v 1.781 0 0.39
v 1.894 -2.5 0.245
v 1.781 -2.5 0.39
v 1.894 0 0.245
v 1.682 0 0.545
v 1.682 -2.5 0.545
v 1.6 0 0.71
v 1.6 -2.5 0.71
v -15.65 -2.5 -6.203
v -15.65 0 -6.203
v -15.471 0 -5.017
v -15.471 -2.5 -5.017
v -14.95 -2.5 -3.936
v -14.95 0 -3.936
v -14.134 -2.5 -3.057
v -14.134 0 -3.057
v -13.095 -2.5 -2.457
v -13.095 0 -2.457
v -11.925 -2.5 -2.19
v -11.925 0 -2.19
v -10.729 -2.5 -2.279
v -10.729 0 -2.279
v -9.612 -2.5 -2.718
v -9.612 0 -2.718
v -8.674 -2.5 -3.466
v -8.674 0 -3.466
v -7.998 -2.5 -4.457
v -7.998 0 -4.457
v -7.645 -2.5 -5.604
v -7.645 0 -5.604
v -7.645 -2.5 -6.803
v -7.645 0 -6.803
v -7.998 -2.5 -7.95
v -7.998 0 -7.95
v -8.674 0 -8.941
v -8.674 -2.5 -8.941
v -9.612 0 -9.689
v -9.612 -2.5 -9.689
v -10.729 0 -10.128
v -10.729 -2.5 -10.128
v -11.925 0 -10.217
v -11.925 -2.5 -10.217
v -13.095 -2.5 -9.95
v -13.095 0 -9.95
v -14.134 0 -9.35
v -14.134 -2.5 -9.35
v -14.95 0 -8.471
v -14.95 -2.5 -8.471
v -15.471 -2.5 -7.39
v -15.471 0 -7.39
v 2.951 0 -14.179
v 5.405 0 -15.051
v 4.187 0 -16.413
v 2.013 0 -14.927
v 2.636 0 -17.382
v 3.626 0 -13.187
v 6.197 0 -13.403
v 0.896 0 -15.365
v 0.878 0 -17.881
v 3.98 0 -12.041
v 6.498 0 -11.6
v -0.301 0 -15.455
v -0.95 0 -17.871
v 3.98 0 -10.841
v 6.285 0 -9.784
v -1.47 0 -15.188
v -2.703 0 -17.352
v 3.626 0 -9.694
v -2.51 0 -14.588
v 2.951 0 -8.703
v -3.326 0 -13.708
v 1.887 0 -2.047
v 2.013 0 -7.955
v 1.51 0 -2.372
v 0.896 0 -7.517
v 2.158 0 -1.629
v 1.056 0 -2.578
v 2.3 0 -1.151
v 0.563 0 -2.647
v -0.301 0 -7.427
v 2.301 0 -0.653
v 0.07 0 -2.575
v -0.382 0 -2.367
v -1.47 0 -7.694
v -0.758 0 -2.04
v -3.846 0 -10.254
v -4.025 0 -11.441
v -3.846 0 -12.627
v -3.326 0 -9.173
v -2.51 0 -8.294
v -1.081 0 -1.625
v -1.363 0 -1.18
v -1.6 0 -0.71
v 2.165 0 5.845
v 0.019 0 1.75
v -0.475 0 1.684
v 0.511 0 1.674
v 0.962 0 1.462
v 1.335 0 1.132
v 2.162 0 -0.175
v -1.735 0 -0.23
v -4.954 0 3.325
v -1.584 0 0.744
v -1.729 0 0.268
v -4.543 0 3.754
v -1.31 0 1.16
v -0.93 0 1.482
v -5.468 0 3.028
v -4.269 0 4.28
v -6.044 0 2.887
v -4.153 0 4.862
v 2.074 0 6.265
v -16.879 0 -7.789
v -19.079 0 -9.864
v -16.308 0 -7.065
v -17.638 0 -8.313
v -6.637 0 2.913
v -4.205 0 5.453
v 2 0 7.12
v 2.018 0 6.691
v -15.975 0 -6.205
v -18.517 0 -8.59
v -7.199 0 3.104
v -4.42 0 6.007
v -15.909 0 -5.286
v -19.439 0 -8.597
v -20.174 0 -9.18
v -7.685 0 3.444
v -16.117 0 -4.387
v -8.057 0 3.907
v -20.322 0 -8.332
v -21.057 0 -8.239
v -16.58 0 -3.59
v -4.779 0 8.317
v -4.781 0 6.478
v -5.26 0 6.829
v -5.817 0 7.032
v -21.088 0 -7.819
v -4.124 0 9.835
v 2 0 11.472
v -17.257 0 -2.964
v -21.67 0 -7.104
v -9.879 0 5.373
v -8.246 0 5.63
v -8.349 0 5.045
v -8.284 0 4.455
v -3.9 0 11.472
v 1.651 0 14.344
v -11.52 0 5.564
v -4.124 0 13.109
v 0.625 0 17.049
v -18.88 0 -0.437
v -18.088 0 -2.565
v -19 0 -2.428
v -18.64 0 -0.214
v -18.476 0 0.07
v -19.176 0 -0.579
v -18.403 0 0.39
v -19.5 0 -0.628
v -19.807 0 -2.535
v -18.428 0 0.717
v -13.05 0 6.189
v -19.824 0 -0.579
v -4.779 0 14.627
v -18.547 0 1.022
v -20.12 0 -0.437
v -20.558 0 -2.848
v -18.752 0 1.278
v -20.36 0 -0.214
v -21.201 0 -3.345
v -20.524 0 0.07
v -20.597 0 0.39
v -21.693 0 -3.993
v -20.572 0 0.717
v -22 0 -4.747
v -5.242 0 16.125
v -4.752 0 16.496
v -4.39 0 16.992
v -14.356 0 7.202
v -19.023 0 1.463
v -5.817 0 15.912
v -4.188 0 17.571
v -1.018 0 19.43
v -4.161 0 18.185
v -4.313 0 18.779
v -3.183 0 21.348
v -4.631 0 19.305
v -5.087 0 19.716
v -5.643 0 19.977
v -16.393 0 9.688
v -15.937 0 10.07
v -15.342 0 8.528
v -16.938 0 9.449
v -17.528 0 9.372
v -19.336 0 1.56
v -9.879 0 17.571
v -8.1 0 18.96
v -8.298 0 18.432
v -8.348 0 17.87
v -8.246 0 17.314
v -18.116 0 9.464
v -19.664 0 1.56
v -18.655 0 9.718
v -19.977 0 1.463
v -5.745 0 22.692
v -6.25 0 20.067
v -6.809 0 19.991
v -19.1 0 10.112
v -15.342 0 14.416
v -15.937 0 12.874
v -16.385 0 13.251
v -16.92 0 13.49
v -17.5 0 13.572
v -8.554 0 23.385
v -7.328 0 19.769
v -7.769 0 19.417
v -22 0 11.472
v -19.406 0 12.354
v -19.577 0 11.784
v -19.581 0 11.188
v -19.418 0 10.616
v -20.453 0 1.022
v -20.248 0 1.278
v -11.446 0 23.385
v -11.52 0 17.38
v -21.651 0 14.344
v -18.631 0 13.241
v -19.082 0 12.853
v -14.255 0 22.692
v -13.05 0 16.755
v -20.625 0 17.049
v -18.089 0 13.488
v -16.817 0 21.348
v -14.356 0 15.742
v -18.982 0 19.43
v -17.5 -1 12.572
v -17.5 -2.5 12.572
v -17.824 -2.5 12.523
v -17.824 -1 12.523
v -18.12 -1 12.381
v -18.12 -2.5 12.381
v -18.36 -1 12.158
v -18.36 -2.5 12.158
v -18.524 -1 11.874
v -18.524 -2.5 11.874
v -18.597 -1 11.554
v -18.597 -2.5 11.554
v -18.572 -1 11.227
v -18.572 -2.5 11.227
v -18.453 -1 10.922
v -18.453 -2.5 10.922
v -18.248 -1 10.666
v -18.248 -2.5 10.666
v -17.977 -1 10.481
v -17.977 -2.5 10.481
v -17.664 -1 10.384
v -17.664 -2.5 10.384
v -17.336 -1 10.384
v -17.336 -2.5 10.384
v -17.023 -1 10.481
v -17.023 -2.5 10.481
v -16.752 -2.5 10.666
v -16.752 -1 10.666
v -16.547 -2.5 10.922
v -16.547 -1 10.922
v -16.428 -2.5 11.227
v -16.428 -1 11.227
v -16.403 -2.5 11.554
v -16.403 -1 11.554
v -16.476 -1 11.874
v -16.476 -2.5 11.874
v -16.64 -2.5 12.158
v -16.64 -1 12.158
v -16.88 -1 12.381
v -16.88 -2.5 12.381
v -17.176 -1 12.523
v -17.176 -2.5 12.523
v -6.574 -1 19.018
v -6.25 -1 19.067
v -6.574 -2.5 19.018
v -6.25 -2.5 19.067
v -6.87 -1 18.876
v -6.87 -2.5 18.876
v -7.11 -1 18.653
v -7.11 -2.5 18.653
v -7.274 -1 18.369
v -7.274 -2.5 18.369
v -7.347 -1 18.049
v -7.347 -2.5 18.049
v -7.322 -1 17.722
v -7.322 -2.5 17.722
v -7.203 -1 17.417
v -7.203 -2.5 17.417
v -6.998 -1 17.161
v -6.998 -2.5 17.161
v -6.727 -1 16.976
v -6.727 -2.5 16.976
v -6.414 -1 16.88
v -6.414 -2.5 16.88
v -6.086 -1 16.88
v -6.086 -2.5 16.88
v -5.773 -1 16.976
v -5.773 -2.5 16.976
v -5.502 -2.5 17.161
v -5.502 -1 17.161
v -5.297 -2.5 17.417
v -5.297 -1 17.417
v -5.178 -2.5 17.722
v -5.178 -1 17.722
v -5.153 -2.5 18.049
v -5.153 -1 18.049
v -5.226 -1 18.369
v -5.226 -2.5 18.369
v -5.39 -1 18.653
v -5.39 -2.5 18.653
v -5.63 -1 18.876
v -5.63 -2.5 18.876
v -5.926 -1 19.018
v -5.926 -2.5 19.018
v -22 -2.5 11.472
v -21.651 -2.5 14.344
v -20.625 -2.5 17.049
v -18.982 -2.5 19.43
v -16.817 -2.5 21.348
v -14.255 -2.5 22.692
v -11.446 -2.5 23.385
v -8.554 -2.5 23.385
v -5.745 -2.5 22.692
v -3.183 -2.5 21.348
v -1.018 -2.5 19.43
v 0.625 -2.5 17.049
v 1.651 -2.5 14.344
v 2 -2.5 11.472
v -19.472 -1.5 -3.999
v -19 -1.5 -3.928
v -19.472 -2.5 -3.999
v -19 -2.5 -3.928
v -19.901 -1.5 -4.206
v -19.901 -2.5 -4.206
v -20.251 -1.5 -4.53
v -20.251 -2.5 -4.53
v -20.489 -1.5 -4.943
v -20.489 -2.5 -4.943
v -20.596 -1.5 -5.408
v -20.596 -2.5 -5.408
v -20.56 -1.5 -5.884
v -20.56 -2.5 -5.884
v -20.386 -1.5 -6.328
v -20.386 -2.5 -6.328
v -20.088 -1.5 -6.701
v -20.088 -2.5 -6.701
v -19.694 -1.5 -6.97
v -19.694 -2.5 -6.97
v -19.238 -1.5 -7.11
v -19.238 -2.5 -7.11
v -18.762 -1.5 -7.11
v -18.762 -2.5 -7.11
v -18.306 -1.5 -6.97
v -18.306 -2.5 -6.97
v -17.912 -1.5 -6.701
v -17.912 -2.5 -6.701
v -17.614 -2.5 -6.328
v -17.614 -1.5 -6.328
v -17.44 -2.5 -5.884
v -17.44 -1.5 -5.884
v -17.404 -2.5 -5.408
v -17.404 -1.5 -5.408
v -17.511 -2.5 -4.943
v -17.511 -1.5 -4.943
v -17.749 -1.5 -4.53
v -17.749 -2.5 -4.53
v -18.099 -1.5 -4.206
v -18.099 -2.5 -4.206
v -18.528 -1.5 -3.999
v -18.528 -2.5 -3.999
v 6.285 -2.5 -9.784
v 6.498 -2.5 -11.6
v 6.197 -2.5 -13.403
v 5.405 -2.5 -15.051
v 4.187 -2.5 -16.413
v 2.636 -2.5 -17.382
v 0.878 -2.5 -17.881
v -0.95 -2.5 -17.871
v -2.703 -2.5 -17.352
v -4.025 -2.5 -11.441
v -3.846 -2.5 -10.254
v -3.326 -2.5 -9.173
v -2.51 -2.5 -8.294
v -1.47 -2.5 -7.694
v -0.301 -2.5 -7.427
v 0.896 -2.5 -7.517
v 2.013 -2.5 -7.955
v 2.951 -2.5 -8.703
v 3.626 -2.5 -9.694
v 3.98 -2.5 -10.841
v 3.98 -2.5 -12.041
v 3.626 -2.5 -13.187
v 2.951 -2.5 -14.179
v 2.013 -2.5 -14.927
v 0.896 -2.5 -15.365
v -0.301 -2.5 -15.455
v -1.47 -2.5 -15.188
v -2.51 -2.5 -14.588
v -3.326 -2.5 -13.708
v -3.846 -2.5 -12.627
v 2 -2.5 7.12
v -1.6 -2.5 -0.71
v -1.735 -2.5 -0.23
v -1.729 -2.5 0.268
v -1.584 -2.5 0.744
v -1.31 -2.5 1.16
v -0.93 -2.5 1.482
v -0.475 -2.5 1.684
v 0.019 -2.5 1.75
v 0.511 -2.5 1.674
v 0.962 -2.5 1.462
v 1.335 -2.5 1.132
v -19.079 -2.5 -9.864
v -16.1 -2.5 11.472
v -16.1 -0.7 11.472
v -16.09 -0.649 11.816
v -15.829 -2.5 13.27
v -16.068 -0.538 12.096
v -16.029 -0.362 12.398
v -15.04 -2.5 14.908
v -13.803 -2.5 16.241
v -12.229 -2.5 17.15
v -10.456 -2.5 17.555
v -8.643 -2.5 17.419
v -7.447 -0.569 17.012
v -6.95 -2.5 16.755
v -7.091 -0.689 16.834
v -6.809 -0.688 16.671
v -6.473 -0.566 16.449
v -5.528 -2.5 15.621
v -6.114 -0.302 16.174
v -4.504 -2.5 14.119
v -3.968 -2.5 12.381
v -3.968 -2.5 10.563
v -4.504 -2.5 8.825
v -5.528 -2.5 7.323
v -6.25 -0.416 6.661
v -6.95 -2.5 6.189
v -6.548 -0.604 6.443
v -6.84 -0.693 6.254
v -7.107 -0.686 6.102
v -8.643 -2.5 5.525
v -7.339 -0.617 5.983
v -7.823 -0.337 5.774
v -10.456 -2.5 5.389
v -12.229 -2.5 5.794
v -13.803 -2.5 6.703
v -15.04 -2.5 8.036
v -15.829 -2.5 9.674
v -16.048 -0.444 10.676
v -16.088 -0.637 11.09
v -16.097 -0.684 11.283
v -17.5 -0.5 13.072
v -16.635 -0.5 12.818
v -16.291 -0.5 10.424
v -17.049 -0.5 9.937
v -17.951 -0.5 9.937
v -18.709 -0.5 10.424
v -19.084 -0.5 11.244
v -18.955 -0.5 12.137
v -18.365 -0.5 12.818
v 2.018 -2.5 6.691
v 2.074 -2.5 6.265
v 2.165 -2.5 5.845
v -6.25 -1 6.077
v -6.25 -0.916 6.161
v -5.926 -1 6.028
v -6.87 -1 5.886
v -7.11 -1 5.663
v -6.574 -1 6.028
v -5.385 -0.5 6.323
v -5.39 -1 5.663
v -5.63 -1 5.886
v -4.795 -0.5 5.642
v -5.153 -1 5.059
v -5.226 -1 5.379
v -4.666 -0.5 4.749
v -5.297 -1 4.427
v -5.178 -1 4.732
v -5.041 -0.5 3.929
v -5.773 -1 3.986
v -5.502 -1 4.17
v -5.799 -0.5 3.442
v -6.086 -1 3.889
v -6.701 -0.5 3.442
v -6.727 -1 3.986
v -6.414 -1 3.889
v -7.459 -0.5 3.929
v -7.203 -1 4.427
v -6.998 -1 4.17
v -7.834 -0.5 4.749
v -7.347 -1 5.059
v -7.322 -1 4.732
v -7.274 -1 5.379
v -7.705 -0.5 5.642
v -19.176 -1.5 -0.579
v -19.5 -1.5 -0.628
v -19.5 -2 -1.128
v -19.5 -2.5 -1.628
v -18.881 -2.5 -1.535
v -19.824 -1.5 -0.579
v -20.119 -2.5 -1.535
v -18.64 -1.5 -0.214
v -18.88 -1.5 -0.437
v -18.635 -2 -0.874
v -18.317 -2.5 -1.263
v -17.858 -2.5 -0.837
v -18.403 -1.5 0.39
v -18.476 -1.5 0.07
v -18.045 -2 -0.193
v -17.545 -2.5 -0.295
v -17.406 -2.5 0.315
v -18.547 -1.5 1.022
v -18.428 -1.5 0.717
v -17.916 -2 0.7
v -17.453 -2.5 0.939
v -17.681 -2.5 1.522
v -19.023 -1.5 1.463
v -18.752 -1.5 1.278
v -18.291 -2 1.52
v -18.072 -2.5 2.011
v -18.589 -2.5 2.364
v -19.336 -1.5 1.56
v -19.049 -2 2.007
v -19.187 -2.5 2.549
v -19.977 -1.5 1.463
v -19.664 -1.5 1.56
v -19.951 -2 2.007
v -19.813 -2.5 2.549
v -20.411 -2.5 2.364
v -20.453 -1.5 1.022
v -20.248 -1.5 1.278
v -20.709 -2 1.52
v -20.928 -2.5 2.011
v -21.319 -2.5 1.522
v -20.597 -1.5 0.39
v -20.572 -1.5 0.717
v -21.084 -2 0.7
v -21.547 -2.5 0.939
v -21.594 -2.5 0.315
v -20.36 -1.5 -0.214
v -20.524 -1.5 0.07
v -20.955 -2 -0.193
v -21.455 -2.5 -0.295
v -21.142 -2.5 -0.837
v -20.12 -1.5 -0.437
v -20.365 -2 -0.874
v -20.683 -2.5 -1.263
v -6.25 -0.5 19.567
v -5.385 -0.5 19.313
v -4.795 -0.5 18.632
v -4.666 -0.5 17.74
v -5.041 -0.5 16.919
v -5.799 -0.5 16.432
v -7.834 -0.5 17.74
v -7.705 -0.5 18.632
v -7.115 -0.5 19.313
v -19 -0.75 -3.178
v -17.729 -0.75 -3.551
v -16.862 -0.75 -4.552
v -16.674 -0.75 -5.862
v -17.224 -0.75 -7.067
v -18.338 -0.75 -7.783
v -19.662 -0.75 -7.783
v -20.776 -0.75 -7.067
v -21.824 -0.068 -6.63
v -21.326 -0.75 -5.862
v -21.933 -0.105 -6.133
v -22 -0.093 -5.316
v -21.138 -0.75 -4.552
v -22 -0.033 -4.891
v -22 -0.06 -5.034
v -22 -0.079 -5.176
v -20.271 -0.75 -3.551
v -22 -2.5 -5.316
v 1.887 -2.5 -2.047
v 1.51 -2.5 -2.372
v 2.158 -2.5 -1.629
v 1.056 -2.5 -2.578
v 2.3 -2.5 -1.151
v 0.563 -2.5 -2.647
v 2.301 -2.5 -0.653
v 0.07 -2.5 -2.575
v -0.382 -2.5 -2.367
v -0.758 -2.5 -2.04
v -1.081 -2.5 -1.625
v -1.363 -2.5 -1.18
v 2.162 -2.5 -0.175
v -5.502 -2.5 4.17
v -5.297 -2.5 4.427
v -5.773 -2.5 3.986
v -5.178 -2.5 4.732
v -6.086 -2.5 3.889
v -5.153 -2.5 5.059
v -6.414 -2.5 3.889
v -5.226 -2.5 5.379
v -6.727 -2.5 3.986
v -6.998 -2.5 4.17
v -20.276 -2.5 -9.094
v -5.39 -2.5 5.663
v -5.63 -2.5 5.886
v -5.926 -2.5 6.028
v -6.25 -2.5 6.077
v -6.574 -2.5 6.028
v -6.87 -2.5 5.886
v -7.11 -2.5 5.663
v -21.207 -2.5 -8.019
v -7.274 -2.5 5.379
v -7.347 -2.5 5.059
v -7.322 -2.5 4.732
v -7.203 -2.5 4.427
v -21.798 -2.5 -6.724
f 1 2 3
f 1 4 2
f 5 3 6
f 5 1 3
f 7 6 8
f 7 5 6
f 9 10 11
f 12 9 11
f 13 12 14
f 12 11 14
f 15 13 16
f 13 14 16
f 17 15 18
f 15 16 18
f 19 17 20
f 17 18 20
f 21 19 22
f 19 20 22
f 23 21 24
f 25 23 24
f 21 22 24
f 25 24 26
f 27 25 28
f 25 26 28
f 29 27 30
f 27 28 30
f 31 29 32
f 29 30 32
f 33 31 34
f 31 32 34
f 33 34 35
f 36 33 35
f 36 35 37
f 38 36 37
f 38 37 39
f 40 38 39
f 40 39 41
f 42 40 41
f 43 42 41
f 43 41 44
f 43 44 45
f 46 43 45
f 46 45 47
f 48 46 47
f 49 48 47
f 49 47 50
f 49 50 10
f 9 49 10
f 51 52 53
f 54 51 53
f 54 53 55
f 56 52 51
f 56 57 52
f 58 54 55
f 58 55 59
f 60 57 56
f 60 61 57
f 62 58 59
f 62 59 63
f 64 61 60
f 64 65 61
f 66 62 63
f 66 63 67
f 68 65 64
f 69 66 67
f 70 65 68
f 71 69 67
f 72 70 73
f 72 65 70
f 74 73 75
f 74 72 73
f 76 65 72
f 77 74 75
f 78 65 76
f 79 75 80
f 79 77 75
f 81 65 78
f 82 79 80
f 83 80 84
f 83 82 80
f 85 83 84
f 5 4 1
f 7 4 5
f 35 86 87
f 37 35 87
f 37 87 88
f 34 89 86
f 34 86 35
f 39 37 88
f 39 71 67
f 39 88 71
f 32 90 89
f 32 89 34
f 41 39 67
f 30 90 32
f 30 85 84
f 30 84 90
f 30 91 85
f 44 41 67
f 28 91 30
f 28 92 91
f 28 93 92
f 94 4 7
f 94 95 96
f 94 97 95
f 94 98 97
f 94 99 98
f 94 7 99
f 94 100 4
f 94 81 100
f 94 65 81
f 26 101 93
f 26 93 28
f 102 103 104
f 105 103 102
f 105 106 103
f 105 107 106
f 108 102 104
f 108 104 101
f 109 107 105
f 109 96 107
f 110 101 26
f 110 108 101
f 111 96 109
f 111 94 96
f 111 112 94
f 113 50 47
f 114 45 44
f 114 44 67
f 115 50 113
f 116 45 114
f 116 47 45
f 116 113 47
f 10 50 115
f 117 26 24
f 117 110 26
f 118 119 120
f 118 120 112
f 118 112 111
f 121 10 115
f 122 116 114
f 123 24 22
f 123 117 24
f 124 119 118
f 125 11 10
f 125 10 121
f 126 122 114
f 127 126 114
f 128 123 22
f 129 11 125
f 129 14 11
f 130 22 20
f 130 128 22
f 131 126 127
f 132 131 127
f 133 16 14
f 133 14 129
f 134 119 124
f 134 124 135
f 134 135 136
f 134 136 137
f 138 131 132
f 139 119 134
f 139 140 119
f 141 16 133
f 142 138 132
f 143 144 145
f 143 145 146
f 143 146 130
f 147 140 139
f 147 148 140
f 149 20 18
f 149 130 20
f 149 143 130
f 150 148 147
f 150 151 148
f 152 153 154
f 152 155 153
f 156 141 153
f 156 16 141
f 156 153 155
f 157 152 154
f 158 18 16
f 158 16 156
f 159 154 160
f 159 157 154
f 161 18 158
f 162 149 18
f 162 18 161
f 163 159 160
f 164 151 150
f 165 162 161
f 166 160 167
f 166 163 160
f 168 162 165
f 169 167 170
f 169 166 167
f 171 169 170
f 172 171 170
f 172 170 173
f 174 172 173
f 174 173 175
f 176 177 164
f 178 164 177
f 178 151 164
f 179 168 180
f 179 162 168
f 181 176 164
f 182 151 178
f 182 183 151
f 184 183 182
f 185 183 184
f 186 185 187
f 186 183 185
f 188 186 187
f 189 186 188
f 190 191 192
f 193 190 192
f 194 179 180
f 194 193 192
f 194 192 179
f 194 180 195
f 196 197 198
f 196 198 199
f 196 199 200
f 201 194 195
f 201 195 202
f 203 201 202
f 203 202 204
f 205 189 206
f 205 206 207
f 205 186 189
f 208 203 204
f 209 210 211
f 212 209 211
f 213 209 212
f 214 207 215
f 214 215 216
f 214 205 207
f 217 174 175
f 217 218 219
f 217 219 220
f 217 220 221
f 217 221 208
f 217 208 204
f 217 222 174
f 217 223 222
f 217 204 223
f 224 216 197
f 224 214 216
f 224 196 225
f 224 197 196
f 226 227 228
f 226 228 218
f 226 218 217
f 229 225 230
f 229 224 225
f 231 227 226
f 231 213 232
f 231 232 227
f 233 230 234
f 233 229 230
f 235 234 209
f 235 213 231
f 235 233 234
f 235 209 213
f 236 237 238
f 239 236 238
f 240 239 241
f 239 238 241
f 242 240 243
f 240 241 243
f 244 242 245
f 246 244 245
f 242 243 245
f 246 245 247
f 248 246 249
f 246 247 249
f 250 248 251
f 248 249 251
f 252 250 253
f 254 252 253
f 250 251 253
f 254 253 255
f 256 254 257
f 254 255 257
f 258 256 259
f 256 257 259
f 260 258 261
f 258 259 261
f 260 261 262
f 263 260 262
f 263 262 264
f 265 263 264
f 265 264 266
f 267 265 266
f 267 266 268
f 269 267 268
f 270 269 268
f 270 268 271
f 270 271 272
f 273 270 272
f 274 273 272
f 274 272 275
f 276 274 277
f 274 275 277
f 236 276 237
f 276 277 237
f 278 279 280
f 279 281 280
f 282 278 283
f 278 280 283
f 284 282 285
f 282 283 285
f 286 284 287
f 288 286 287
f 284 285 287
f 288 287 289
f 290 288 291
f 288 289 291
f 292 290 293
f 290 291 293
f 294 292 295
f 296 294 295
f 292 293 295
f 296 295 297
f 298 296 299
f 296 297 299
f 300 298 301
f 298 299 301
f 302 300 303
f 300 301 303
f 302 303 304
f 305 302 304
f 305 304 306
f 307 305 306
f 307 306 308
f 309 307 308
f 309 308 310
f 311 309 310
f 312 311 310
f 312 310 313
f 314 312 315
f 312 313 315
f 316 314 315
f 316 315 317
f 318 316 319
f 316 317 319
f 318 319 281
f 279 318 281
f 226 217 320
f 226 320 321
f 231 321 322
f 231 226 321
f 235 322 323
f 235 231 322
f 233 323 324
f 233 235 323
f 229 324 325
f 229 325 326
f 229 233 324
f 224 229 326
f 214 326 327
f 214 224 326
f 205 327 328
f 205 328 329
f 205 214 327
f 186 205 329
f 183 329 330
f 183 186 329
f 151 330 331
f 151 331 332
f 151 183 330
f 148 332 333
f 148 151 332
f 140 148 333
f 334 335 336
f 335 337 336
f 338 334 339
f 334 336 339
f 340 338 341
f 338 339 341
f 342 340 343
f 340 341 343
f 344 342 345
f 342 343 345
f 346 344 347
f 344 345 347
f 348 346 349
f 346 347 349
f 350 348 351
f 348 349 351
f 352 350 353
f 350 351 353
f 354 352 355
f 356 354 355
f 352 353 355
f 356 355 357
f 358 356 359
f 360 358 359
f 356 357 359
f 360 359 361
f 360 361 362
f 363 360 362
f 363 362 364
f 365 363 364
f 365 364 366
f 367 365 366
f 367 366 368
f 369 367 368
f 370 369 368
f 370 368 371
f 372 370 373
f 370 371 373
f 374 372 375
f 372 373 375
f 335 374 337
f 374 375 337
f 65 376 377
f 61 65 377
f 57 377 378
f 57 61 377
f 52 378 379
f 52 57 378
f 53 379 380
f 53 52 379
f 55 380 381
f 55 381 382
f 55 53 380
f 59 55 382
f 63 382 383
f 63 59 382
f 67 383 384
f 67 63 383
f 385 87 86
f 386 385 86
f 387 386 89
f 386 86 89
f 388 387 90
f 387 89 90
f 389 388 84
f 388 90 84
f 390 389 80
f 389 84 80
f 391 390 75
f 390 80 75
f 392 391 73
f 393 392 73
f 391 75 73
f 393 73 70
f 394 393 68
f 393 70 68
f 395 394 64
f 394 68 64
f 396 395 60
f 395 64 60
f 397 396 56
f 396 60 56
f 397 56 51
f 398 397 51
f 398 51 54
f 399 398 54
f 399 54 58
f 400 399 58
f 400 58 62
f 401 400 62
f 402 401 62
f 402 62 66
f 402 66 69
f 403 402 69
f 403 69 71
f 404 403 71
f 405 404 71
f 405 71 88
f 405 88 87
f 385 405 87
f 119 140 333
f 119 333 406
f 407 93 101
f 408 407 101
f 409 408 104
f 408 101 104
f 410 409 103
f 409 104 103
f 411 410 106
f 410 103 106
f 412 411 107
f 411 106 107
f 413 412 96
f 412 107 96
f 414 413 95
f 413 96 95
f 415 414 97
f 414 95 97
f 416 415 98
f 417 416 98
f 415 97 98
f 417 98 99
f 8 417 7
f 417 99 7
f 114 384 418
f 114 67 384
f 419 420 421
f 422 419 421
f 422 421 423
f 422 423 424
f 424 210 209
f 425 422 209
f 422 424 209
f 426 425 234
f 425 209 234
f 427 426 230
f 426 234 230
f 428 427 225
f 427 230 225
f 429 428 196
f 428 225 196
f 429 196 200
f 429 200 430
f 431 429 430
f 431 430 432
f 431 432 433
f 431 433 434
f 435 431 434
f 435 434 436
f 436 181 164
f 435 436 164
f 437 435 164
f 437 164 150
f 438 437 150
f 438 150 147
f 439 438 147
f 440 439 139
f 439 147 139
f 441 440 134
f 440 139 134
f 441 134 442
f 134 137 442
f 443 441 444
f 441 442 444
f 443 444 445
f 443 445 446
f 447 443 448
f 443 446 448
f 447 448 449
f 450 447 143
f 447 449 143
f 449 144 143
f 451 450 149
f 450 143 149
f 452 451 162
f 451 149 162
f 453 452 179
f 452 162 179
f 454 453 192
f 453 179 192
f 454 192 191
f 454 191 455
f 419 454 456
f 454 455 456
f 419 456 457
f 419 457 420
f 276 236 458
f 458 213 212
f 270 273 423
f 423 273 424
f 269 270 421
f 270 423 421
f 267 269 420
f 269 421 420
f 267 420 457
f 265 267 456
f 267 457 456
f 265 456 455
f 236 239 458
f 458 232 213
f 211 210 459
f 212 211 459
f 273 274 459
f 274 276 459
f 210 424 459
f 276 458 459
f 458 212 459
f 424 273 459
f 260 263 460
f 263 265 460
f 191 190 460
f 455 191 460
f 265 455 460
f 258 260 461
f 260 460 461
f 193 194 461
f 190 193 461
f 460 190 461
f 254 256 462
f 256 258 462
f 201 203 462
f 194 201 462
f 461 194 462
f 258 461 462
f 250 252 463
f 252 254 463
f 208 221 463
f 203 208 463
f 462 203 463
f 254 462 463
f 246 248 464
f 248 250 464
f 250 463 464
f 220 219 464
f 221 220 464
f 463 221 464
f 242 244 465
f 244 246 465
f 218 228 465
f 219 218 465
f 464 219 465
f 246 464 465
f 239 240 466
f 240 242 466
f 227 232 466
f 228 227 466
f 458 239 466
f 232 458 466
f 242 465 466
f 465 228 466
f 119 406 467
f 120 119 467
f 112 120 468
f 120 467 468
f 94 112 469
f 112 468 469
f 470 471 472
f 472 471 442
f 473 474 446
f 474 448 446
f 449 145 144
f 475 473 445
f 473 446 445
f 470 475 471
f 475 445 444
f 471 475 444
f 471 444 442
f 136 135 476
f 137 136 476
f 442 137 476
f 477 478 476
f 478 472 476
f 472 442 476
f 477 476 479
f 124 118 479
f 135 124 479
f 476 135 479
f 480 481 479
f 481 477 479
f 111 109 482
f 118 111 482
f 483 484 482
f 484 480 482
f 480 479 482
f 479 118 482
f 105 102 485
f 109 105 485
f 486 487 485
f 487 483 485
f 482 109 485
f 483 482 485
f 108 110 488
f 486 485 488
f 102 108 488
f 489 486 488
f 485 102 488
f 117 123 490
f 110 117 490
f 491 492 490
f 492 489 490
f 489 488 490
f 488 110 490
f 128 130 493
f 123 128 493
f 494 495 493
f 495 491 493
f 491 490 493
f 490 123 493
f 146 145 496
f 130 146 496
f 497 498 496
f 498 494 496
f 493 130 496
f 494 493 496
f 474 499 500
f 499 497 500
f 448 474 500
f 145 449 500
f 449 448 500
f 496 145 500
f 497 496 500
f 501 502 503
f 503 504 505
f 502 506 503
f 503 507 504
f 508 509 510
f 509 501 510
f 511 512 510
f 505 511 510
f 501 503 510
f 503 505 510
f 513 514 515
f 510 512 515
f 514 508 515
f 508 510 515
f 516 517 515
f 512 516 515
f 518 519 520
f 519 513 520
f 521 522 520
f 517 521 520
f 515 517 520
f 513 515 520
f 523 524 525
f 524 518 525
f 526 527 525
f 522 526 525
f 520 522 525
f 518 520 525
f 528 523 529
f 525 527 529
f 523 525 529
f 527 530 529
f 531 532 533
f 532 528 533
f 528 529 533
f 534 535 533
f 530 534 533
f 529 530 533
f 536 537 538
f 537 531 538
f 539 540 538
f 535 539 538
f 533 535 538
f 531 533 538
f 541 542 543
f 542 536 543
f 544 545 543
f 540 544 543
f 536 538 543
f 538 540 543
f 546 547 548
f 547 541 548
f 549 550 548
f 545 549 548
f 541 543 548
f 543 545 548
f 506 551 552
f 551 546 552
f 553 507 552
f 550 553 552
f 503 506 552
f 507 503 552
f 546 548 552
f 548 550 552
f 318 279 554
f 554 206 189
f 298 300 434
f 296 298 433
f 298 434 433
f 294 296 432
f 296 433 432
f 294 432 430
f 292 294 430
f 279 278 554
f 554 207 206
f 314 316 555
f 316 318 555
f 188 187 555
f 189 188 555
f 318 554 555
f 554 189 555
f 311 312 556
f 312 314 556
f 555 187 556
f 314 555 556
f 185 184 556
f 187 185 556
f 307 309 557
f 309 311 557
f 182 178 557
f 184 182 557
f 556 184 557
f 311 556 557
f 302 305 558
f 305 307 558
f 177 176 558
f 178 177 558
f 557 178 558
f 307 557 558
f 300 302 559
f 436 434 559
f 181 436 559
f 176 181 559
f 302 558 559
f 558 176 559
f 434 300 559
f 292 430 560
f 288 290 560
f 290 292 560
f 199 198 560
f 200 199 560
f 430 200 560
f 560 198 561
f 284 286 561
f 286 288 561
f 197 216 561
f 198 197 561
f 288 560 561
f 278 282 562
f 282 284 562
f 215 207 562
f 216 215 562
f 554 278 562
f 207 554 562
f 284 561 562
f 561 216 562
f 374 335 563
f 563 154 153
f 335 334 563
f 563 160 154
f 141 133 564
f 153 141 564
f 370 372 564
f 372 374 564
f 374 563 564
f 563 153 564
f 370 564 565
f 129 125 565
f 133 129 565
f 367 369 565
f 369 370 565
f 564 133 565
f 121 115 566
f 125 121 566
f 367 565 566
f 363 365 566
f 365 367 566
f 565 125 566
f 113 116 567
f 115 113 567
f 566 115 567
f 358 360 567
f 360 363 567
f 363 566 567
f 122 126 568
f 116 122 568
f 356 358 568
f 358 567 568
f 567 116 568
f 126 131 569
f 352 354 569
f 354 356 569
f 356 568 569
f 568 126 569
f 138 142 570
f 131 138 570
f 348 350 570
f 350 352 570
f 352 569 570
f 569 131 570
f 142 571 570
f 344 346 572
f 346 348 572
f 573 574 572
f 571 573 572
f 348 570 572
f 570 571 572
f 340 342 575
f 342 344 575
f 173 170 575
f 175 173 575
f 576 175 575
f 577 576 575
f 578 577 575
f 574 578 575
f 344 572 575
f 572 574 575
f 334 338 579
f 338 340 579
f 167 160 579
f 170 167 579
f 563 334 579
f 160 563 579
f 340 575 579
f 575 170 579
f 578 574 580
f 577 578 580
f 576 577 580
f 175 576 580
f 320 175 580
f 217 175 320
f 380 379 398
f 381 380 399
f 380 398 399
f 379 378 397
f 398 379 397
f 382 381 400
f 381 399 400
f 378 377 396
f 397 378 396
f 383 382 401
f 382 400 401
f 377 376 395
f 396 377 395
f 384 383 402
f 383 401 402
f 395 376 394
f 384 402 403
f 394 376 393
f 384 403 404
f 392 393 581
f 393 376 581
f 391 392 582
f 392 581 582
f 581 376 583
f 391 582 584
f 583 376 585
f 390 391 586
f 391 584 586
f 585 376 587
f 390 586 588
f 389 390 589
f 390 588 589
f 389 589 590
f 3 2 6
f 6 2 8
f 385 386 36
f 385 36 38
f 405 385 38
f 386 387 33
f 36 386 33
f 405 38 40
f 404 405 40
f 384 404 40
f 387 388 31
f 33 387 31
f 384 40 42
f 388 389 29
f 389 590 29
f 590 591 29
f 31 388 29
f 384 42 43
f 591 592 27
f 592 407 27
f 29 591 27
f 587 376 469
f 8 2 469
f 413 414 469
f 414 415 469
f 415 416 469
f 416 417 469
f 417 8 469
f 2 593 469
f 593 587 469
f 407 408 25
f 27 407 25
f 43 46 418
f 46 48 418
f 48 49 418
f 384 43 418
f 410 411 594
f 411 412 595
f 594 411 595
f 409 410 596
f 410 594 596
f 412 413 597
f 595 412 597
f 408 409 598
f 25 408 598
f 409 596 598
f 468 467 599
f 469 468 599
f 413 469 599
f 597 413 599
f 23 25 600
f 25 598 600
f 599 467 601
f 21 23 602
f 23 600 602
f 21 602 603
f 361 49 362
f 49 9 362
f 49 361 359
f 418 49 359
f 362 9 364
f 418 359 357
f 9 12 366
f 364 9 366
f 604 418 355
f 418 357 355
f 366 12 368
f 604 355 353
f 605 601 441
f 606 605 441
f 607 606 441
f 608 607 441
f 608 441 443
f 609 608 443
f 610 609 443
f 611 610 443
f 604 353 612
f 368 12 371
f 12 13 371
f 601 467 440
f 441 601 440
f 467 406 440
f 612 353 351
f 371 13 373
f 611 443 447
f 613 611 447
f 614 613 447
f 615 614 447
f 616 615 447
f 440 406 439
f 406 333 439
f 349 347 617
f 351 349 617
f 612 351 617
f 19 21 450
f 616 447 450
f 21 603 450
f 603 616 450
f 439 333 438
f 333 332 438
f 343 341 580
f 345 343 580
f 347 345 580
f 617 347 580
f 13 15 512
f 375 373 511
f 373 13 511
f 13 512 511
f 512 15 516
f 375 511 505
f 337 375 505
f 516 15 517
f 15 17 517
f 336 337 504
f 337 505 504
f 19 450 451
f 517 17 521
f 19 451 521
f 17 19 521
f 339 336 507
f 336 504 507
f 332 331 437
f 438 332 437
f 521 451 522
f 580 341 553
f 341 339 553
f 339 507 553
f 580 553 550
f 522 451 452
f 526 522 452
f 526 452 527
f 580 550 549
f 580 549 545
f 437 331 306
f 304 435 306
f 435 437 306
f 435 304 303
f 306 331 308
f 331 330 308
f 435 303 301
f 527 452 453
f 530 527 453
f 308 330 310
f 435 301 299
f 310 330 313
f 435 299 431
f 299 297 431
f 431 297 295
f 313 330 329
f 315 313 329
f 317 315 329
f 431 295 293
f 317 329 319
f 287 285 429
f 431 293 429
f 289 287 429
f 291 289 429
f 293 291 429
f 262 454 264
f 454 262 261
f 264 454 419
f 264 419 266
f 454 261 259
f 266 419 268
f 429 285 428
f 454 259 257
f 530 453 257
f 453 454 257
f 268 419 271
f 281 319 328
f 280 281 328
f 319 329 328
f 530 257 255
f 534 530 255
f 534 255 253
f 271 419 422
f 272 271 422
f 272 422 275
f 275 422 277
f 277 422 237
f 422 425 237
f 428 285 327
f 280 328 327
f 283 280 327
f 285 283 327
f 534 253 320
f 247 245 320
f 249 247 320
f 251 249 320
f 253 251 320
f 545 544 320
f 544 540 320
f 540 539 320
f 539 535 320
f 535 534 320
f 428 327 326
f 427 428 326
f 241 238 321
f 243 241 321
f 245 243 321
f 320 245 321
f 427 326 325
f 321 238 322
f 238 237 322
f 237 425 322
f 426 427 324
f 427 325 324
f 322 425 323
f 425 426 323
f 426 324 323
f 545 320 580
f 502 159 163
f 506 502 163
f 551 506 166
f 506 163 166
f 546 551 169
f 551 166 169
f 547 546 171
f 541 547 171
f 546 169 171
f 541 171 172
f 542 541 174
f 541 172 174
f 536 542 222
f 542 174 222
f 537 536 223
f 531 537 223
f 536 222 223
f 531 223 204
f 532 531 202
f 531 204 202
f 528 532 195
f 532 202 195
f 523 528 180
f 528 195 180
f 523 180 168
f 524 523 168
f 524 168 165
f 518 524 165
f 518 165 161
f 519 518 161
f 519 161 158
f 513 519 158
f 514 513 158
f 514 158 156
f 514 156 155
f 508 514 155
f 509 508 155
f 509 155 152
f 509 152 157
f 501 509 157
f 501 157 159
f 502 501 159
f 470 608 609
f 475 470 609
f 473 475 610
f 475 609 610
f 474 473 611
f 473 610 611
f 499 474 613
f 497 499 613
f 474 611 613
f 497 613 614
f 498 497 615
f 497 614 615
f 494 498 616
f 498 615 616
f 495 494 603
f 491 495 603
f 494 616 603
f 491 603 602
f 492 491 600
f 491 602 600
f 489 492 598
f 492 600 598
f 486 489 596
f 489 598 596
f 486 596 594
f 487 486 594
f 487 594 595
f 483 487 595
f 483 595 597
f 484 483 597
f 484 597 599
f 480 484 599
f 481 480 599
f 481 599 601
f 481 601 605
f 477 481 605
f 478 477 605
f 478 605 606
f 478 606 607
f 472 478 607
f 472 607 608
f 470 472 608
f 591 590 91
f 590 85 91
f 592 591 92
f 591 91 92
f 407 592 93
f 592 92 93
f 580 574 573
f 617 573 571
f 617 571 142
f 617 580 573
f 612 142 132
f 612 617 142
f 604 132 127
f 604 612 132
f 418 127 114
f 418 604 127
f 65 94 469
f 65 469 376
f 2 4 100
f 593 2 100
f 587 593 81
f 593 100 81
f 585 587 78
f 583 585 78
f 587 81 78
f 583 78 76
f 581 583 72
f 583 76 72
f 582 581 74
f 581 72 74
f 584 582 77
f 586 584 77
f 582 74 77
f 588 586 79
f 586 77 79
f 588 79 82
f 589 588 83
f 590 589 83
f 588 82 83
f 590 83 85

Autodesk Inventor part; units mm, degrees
ref_plane "YZ Plane" through (0, 0, 0) normal (1, 0, 0) x (0, 1, 0)
ref_plane "XZ Plane" through (0, 0, 0) normal (0, 1, 0) x (-1, 0, 0)
ref_plane "XY Plane" through (0, 0, 0) normal (0, 0, 1) x (1, 0, 0)
sketch "Sketch1" plane through (0, 0, 0) normal (0, 1, 0) x (-1, 0, 0)
  circle A0 centre (0, 0) radius 1.75 construction
  circle A1 centre (10, 11.472032) radius 12
  line L0 (0, 0) -> (10, 11.472032) construction
  line L1 (0, 0) -> (4, 0) construction
  circle A2 centre (0, 0) radius 4 construction
  circle A3 centre (0, -11.440846) radius 6.5
  line L2 (10, 11.472032) -> (0, -11.440846) construction
  line L3 (0, 0) -> (0, -11.440846) construction
  line L4 (0, 0) -> (0, -4) construction
  line L5 (22, 11.472032) -> (22, -8.527968)
  line L6 (22, -8.527968) -> (2.703128, -17.352115)
  line L7 (-2, 11.472032) -> (-2, 6.472032)
  line L8 (-2, 6.472032) -> (-6.285281, -9.783969)
  circle A4 centre (10, 11.472032) radius 9.55
  line L9 (10, 11.472032) -> (17.5, 11.472032) construction
  circle A5 centre (17.5, 11.472032) radius 1.1
  circle A6 centre (6.25, 17.967223) radius 1.1
  circle A7 centre (6.25, 4.976842) radius 1.1
  circle A8 centre (10, 11.472032) radius 6.1
  circle A9 centre (0, -11.440846) radius 4.025
  circle A10 centre (10, 11.472032) radius 10
  circle A11 centre (0, -11.440846) radius 5
  circle A12 centre (11.624641, -6.20346) radius 7.75
  circle A13 centre (11.624641, -6.20346) radius 4.025
  circle A14 centre (19, -5.527968) radius 1.6
  circle A15 centre (19.5, 0.472032) radius 1.35
  circle A16 centre (0, -11.440846) radius 5.5
  circle A17 centre (10, 11.472032) radius 10.5
  dimension "d5" = 8
  dimension "d0" = 3.5
  dimension "d1" = 24
  dimension "d2" = 4
  dimension "d4" = 10
  dimension "d6" = 13
  dimension "d7" = 25
  dimension "d8" = 17.5
  dimension "d12" = 0
  dimension "d13" = 20
  dimension "d14" = 5
  dimension "d17" = 19.1
  dimension "d19" = 7.5
  dimension "d20" = 2.2
  dimension "d23" = 360
  dimension "d25" = 12.2
  dimension "d26" = 8.05
  dimension "d38" = 20
  dimension "d39" = 10
  dimension "d40" = 15.5
  dimension "d41" = 8.05
  dimension "d42" = 3.2
  dimension "d43" = 3
  dimension "d44" = 3
  dimension "d53" = 2.5
  dimension "d54" = 9
  dimension "d56" = 2.7
  dimension "d67" = 11
  dimension "d69" = 21
sketch "Sketch1 outline for Extrusion1" plane through (0, 0, 0) normal (0, 1, 0) x (-1, 0, 0)
  circle A0 centre (10, 11.472032) radius 6.1
  line L0 (-2, 11.472032) -> (-2, 6.472032)
  line L1 (-2, 6.472032) -> (-6.285281, -9.783969)
  arc A1 (-6.285281, -9.783969) -> (2.703128, -17.352115) centre (0, -11.440846) ccw
  line L2 (2.703128, -17.352115) -> (22, -8.527968)
  line L3 (22, -8.527968) -> (22, 11.472032)
  arc A2 (22, 11.472032) -> (-2, 11.472032) centre (10, 11.472032) ccw
extrude "Extrusion1" add sketch "Sketch1 outline for Extrusion1" against normal blind 2.5
sketch "Sketch1 outline for Extrusion2" plane through (0, 0, 0) normal (0, 1, 0) x (-1, 0, 0)
  circle A0 centre (0, -11.440846) radius 4.025
  circle A1 centre (11.624641, -6.20346) radius 4.025
extrude "Extrusion2" cut sketch "Sketch1 outline for Extrusion2" against normal blind 2.5
hole "Hole1" at (-17.5, 0, 11.472032) at (-6.25, 0, 17.967223) at (-6.25, 0, 4.976842) direction (0, -1, 0) diameter 2.2 end through all countersink diameter 4.2 countersink angle 90
hole "Hole2" at (-19, 0, -5.527968) direction (0, -1, 0) diameter 3.2 end through all countersink diameter 6.2 countersink angle 90
fillet "Fillet1" radius 5 2 edges at (-22, -1.25, -8.528) (2, -1.25, 6.472)
sketch "Sketch3" plane through (0, -2.5, 0) normal (0, -1, 0) x (1, 0, 0)
  point P0 (0, 0)
  point P1 (-19.5, 0.472032)
hole "Hole3" at (-19.5, -2.5, 0.472032) direction (0, 1, 0) diameter 2.2 end through all countersink diameter 4.2 countersink angle 90
sketch "Sketch4" plane through (0, 0, 0) normal (0, 1, 0) x (1, 0, 0)
  circle A0 centre (0, 0) radius 1.75 construction
  circle A1 centre (0, 0) radius 4 construction
  line L0 (2, -1.472032) -> (3.318061, -1.472032) construction
  line L1 (6.285281, 9.783969) -> (2.165168, -5.845474)
  arc A2 (0.568061, 0.897337) -> (0, 0) centre (3.318061, -1.472032) ccw construction
  arc A3 (-0.757721, 2.039616) -> (-1.599646, 0.709671) centre (3.318061, -1.472032) ccw
  arc A4 (1.893843, -0.244942) -> (1.599646, -0.709671) centre (3.318061, -1.472032) ccw
  arc A5 (1.893843, -0.244942) -> (-0.757721, 2.039616) centre (0.568061, 0.897337) ccw
  arc A6 (-1.599646, 0.709671) -> (1.599646, -0.709671) centre (0, 0) ccw
  line L2 (2, -1.472032) -> (2, -6.472032) construction
  dimension "d74" = 2.75
  dimension "d80" = 5
extrude "Extrusion3" cut sketch "Sketch4" against normal blind 2.5
properties part number "Dribbler Bracket"
